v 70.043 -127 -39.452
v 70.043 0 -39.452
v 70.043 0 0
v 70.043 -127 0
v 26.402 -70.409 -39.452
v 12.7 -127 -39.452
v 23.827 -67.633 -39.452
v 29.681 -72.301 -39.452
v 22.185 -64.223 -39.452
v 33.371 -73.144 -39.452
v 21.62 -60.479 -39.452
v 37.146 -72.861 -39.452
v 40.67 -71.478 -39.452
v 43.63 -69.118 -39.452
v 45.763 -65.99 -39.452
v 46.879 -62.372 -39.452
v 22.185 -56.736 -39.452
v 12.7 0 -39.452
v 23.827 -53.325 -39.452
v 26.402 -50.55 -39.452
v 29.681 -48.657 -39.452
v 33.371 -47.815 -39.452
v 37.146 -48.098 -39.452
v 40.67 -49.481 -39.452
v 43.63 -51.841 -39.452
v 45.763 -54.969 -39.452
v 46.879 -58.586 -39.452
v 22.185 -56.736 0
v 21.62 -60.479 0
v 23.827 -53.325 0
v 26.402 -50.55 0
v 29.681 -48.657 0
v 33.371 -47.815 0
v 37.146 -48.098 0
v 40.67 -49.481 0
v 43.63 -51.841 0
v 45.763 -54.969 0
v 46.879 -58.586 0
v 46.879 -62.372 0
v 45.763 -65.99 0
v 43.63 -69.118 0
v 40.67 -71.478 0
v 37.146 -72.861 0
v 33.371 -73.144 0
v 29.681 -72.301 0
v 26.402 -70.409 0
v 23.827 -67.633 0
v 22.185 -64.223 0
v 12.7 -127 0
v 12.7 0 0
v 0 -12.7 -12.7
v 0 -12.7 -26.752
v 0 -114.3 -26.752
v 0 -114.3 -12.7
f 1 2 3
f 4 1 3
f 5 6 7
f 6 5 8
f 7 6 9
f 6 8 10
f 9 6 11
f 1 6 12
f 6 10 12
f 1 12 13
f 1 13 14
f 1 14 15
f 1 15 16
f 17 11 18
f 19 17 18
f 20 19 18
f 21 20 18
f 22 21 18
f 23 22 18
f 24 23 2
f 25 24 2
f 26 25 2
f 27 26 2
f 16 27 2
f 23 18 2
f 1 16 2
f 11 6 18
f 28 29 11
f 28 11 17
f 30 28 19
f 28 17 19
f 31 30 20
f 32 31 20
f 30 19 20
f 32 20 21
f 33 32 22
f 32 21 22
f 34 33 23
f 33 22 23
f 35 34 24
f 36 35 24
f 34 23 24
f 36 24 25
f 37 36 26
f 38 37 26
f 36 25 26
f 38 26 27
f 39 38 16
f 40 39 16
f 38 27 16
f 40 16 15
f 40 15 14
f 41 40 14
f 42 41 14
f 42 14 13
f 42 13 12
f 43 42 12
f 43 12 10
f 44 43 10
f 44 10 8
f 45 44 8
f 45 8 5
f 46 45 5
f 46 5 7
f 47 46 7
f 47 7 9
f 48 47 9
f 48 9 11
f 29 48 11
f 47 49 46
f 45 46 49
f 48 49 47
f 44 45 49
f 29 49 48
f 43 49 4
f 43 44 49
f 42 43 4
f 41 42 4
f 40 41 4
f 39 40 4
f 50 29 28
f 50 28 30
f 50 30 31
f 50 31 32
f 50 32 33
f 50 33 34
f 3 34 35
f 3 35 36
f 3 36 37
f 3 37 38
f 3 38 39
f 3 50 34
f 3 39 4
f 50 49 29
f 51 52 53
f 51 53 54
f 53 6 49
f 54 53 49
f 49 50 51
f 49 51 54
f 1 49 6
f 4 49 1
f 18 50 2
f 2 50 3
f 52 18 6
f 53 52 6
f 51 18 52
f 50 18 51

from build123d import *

# Parameters (mm, degrees)
F0_W     = 70.042707
F0_H     = 39.452329
F1_DEPTH = 127
F3_D     = 25.4
F4_SIZE  = 12.7


with BuildPart() as f1:
    # F0 (on Front) → F1 (new body)
    with BuildSketch(Plane.XZ):
        with Locations((35.021353, -19.726164)):
            Rectangle(F0_W, F0_H)
    extrude(amount=F1_DEPTH)

    # F3 (through all)
    with Locations(Plane.XY):
        with Locations((34.320448, -60.479335)):
            Hole(F3_D / 2)

    # F4
    f4_edges = [f1.edges().sort_by_distance(p)[0] for p in [
        (0, -63.5, 0),
        (0, -63.5, -39.452329),
        (0, 0, -19.726165),
        (0, -127, -19.726165),
    ]]
    chamfer(f4_edges, length=F4_SIZE)


solid = f1.part
